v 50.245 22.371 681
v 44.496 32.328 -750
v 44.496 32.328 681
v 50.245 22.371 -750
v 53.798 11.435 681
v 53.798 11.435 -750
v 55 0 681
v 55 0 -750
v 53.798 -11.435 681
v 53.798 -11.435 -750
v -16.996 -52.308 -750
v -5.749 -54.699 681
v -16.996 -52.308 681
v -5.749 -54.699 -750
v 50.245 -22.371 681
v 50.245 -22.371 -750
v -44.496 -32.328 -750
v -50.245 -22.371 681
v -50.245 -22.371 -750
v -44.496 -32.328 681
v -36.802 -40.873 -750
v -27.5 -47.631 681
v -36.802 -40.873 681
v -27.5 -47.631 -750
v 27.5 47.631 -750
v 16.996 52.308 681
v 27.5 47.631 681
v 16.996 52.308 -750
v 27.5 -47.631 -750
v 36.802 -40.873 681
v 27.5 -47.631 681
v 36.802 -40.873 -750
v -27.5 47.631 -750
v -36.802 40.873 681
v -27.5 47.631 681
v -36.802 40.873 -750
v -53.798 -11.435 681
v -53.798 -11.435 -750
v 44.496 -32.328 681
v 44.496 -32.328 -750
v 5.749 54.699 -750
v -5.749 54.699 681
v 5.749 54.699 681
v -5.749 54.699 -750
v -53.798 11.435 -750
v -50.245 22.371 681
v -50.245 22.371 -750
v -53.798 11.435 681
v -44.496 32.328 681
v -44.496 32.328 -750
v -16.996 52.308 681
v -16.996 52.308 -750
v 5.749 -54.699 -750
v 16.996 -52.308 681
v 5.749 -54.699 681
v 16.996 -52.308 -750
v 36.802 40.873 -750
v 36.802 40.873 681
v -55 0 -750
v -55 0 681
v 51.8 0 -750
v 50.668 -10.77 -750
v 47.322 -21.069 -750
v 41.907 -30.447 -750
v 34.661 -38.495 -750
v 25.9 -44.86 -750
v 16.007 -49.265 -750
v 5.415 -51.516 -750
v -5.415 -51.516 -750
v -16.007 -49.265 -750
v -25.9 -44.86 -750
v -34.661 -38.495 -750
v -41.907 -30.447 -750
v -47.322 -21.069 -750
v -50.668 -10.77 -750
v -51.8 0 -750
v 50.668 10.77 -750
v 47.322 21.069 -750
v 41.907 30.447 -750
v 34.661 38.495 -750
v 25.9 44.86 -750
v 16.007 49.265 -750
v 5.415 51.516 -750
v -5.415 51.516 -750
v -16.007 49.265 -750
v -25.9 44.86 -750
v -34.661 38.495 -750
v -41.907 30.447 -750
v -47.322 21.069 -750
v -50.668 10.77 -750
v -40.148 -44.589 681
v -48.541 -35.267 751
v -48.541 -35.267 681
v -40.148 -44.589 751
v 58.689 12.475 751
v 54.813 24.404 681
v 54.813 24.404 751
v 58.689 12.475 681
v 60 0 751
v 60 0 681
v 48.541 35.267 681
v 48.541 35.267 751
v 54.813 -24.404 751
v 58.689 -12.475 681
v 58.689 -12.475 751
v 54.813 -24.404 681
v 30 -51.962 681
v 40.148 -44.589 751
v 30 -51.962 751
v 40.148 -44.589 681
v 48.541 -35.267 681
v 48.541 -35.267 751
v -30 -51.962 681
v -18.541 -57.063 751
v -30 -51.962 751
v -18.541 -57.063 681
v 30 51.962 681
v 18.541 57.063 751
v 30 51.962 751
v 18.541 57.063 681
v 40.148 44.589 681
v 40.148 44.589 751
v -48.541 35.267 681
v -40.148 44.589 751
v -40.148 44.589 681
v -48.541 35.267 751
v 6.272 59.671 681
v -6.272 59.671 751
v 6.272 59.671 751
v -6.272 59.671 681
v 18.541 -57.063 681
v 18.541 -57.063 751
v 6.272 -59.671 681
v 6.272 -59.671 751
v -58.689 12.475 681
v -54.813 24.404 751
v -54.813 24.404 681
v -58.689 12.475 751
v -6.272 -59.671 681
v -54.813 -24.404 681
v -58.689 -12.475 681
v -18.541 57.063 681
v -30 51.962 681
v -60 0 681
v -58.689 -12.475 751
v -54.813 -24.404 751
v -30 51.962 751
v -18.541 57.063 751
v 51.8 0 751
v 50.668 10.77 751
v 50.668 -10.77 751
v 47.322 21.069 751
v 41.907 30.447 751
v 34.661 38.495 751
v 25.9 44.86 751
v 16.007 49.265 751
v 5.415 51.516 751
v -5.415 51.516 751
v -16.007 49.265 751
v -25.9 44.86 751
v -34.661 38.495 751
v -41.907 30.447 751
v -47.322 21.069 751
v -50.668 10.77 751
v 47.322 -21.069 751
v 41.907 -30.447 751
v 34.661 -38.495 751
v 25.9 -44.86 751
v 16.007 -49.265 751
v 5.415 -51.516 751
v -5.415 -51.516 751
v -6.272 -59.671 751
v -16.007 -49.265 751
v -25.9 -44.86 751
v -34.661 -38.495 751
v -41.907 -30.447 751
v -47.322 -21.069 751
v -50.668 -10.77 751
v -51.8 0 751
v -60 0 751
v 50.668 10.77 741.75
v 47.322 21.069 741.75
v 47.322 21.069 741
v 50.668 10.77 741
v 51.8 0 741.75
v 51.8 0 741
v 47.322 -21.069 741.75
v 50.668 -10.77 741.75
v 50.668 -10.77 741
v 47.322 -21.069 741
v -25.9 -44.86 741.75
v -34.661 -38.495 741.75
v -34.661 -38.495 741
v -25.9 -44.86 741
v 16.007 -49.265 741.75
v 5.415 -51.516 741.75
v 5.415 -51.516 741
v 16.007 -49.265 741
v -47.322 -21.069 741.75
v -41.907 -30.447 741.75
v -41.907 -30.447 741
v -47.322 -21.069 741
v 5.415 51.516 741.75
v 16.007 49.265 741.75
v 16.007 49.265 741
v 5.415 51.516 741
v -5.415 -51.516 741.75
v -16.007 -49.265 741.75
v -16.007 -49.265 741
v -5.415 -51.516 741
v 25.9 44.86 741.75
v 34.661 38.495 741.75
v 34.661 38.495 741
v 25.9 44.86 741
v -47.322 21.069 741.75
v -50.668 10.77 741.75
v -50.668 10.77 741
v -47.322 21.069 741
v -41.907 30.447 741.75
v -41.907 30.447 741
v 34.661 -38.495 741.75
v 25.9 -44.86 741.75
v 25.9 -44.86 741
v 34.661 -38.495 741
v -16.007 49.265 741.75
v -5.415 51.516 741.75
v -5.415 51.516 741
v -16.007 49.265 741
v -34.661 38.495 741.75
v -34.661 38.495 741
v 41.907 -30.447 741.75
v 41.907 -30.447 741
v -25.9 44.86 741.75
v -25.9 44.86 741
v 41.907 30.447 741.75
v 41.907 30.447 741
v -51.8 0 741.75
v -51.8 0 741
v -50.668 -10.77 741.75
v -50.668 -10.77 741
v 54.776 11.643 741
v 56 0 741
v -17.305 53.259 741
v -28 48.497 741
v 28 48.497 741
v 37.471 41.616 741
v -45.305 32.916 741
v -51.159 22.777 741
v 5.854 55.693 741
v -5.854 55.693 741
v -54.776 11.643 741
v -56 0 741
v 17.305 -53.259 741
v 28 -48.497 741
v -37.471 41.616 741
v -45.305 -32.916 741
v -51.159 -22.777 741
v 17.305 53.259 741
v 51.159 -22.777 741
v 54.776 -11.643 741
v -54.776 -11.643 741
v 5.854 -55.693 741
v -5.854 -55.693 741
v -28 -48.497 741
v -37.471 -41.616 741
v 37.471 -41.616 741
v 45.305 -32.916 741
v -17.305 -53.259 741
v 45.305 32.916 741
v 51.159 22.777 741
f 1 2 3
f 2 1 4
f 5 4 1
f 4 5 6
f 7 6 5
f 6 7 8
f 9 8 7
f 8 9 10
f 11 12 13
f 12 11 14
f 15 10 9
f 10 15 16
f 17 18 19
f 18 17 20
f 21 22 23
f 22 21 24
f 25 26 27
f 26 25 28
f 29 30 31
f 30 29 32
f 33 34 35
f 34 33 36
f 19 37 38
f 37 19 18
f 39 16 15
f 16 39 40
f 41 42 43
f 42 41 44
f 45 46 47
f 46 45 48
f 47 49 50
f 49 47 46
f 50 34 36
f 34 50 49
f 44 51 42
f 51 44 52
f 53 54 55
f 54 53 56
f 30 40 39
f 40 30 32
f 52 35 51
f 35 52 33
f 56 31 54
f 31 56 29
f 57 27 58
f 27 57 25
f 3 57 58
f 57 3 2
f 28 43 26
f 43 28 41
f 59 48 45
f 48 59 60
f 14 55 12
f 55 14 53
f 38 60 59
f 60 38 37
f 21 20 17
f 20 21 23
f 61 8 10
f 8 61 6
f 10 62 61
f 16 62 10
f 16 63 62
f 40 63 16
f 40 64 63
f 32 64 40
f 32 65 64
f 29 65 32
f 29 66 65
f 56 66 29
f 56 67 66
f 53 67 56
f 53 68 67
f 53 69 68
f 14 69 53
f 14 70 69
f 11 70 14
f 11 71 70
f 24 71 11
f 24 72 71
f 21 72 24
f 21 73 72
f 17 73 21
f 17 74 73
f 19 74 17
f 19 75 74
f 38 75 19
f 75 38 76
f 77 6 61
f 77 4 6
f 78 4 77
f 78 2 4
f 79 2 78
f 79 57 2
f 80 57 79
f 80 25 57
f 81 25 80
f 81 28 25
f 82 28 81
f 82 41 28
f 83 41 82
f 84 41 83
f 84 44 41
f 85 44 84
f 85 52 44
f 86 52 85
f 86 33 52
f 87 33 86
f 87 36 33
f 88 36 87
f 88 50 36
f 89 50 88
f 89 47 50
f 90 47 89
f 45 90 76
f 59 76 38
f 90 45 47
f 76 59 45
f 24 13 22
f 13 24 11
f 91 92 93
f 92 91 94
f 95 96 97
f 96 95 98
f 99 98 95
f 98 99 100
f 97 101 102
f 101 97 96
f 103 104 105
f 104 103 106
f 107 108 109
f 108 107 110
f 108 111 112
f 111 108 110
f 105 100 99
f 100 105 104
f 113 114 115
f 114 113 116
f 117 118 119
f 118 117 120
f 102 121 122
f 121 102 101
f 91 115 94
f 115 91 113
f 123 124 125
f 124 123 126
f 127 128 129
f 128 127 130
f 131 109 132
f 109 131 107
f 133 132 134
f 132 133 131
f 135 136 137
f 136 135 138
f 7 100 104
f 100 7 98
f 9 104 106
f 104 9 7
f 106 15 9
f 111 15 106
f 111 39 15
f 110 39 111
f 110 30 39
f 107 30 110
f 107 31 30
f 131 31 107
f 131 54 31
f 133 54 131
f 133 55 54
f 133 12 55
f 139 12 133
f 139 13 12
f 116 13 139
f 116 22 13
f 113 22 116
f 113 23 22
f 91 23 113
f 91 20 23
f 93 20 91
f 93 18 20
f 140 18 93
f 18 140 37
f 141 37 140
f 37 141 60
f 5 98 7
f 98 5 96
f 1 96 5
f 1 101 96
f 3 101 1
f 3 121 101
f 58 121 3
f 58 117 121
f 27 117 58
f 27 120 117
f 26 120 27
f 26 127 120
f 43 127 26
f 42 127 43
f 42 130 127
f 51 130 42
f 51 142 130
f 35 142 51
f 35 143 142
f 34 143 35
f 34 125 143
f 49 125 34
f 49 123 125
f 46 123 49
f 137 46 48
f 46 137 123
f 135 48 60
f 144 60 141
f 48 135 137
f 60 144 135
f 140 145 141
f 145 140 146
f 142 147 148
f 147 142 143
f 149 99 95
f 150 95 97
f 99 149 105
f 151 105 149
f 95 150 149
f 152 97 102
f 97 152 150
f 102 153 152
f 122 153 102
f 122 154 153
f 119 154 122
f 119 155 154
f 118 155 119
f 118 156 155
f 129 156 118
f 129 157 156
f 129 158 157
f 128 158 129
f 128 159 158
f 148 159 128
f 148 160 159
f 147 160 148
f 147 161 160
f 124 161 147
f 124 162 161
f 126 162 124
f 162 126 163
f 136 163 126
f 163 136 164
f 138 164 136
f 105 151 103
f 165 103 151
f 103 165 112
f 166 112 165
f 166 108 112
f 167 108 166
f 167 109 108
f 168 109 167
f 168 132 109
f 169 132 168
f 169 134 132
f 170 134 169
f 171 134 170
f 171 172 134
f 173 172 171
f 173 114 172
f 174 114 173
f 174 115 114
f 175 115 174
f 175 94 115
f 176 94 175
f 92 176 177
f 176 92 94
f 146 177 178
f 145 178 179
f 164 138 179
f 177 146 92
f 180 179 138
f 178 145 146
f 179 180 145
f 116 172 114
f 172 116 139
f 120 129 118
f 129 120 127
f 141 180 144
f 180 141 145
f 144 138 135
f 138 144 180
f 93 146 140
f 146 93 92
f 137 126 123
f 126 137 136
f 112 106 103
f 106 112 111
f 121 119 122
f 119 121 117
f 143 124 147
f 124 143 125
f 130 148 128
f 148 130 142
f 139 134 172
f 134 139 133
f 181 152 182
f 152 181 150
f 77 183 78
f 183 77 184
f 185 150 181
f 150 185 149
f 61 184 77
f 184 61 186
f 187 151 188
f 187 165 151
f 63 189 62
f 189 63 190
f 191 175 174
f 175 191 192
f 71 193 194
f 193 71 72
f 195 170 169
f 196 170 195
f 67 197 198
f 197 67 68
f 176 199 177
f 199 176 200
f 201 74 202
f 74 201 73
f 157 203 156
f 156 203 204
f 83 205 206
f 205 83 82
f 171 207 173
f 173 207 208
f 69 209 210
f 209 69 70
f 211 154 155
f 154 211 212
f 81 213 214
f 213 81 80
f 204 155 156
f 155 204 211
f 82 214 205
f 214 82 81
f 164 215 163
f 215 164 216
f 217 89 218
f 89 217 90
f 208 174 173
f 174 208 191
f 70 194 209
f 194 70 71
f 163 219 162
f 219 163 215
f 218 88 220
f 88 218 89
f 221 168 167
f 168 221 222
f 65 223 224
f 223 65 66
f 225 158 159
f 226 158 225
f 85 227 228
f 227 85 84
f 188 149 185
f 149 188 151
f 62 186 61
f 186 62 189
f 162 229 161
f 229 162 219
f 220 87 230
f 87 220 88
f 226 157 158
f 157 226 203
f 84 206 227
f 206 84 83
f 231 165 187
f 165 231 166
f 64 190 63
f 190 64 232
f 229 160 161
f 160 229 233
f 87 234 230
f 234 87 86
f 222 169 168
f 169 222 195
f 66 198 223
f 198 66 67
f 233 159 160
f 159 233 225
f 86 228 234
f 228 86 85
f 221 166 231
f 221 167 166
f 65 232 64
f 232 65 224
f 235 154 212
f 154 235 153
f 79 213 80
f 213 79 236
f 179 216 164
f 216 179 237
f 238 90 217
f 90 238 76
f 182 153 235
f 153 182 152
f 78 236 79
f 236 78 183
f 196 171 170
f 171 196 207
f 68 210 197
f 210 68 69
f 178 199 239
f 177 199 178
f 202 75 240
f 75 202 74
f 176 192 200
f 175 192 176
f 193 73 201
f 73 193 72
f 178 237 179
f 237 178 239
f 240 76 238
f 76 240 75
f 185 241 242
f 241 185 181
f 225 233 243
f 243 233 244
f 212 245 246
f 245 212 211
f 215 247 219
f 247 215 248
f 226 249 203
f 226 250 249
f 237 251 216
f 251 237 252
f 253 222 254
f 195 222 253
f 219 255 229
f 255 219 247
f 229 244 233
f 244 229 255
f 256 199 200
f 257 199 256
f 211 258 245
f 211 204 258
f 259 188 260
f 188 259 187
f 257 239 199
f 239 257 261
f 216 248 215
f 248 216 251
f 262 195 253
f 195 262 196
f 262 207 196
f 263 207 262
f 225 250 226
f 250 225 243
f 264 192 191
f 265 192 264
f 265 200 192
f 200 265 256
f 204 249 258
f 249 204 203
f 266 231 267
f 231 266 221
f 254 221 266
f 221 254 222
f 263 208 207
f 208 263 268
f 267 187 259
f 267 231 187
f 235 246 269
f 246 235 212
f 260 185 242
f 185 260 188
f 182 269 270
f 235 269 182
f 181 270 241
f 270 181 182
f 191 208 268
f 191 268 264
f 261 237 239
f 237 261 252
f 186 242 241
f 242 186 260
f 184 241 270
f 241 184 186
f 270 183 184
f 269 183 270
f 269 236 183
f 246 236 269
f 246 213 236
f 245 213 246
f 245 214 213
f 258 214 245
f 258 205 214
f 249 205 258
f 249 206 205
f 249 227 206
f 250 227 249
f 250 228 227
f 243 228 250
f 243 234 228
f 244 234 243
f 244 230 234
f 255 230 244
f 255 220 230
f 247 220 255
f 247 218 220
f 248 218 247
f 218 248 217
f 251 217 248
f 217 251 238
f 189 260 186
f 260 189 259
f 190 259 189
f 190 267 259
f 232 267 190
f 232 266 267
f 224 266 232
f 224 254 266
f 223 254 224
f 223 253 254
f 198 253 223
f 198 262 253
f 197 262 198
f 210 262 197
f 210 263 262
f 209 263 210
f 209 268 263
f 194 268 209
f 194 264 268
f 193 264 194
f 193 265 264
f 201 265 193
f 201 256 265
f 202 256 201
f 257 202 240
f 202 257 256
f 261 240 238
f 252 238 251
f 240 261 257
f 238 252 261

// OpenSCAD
// Parameters
pipe_length = 1500; //[750:3000:10]
outer_diameter = 110; //[55:220:1]
wall_thickness = 3.2; //[1.6:6.4:0.1]
socket_length = 70; //[35:140:1]
socket_outer_diameter = 120; //[110:160:1]
chamfer_length = 10; //[3:25:1]
overlap = 1; //[0.5:2:0.1]

// Base Shapes
module pipe_body() {
  translate([0, 0, 0])
    cylinder(h=pipe_length, r=outer_diameter/2, center=true);
}

module pipe_bore() {
  translate([0, 0, 0])
    cylinder(h=pipe_length + 2*overlap, r=outer_diameter/2 - wall_thickness, center=true);
}

module socket_end() {
  translate([0, 0, pipe_length/2 - socket_length/2 + overlap])
    cylinder(h=socket_length, r=socket_outer_diameter/2, center=true);
}

module end_chamfer_cone_pos() {
  translate([0, 0, pipe_length/2 - chamfer_length/2 + overlap])
    cylinder(h=chamfer_length, r1=outer_diameter/2 + overlap, r2=0, center=true);
}

module end_chamfer_cone_neg() {
  translate([0, 0, -pipe_length/2 + chamfer_length/2 - overlap])
    cylinder(h=chamfer_length, r1=outer_diameter/2 + overlap, r2=0, center=true);
}

// Geometry Operations
module pipe_outer_with_socket() {
  union() {
    pipe_body();
    socket_end();
  }
}

module pipe_hollow() {
  difference() {
    pipe_outer_with_socket();
    pipe_bore();
  }
}

module pipe_with_end_chamfers() {
  difference() {
    pipe_hollow();
    end_chamfer_cone_pos();
    end_chamfer_cone_neg();
  }
}

// Final Model
module final_model() {
  pipe_with_end_chamfers();
}

// Render the final model
final_model();
